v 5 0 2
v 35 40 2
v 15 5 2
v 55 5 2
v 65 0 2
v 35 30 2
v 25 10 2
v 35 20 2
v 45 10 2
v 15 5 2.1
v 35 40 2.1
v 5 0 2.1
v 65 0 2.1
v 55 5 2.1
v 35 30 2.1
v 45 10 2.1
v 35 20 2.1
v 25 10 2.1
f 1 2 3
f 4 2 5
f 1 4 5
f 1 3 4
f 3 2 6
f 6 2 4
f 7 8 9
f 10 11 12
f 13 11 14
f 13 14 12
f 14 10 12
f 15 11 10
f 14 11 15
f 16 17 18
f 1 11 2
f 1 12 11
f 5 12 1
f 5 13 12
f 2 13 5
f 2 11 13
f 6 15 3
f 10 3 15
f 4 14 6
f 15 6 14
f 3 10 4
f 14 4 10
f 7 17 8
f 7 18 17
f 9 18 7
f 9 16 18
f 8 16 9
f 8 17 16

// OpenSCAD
union() {
    translate([0,0,+2]) {
        linear_extrude(height=.1) {
            //square(50,center=true);
            scale(5)
            polygon(
                //          6            | 8
                //         / \           |
                //        / 3 \          | 6
                //       / / \ \         |
                //      / / 0 \ \        | 4
                //     / / / \ \ \       |
                //    / / 2---1 \ \      | 2
                //   / 4---------5 \     | 1
                //  8---------------7    | 0
                //-----------------------+----
                //  1  3  5 7 9  11 13   |
                //
                points=[
                    [  7,  4],
                    [  9,  2],
                    [  5,  2],

                    [  7,  6],
                    [  3,  1],
                    [ 11,  1],

                    [  7,  8],
                    [ 13,  0],
                    [  1,  0],
                ],
                paths= [
                    [ 0, 1, 2 ],
                    [ 3, 4, 5 ],
                    [ 6, 7, 8 ],
                ]
            );
        }
    }
    translate([-15,-15,0]) {
        scale(10) {
            %polyhedron(
                //         1------------------0
                //        /|                 /|
                //       / |    9----8      / |
                //      /  5-- /|   /| ----/--4
                //     /  /  11----10|    /  /
                //    /  /    |13--|-12  /  /
                //   3------  |/   |/ --2  /
                //   | /     15----14   | /
                //   |/                 |/
                //   7------------------6
                points=[
                    [3,3,1],
                    [0,3,1],
                    [3,0,1],
                    [0,0,1],
                    [3,3,0],
                    [0,3,0],
                    [3,0,0],
                    [0,0,0],

                    [2,2,1],
                    [1,2,1],
                    [2,1,1],
                    [1,1,1],
                    [2,2,0],
                    [1,2,0],
                    [2,1,0],
                    [1,1,0],
                ],
                faces=[
                    [  4,  5, 13, 12 ],
                    [  4, 12, 14,  6 ],
                    [  6, 14, 15,  7 ],
                    [  7, 15, 13,  5 ],

                    [  1,  0,  8,  9 ],
                    [  0,  2, 10,  8 ],
                    [  2,  3, 11, 10 ],
                    [  3,  1,  9, 11 ],

                    [  8, 10, 14, 12 ],
                    [ 10, 11, 15, 14 ],
                    [ 11,  9, 13, 15 ],
                    [  9,  8, 12, 13 ],

                    [  0,  4,  6,  2 ],
                    [  2,  6,  7,  3 ],
                    [  3,  7,  5,  1 ],
                    [  1,  5,  4,  0 ],
                ]
            );
        };
    }
}
